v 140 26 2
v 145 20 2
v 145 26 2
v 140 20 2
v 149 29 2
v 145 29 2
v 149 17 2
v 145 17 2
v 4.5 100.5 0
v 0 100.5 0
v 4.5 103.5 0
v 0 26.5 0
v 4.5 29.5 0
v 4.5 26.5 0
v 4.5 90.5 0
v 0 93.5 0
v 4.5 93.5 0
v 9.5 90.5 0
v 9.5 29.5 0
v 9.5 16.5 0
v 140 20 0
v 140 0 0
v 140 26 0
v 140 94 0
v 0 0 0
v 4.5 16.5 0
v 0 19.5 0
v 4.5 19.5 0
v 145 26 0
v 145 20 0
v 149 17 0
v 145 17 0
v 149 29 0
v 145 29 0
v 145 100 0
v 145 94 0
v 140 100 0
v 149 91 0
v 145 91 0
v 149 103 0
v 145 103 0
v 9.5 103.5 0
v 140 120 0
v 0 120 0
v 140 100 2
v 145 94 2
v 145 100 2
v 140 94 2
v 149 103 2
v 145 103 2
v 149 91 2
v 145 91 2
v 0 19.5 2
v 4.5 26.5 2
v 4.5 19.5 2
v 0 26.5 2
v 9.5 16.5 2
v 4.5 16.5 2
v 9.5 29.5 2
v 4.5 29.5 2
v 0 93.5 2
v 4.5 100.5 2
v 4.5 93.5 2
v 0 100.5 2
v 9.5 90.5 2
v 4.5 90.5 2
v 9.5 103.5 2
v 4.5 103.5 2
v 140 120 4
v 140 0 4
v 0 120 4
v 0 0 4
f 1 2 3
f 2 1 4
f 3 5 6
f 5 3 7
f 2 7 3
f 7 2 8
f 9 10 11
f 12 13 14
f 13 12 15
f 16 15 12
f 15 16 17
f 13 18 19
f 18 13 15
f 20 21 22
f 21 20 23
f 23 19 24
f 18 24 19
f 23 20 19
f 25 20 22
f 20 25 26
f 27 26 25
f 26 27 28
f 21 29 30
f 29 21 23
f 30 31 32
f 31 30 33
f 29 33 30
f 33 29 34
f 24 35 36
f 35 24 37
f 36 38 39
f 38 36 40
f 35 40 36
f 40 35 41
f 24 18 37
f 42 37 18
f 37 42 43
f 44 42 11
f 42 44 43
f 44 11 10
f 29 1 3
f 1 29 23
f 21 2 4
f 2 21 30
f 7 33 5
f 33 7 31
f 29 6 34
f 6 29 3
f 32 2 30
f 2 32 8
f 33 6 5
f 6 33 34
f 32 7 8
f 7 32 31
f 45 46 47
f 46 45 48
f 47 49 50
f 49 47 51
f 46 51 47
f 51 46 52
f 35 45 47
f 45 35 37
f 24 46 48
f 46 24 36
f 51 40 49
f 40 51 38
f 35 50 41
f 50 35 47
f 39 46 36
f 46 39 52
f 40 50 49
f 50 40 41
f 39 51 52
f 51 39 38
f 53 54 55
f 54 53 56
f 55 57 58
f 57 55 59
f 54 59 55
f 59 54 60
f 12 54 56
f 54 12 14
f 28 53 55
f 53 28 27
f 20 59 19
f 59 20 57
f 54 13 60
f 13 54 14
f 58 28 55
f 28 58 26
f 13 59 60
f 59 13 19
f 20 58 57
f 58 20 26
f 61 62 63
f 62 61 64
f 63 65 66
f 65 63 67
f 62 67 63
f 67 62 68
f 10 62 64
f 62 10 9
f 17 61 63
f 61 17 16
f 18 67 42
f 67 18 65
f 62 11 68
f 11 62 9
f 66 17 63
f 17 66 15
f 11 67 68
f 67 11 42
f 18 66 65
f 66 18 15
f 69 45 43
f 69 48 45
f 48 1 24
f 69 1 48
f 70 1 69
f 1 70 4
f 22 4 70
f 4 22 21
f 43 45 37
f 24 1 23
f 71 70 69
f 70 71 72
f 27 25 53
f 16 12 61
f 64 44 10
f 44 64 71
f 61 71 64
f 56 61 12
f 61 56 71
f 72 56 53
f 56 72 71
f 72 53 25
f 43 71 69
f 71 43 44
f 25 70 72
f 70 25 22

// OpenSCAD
// file: _settings.scad
// These variables specify the default depth and height of the baseplate
BASE_DEFAULT_HEIGHT =   4; //milimeters
BASE_DEFAULT_DEPTH  = 120; //milimeters


// These variables only need to be modified if you have extreme baseplate sizes
feet_width  = 6;
feet_depth  = 5;
feet_height = 2;
feet_lock_width = 12;
feet_lock_depth =  4;
feet_border = 20;


// This is the code to generate a baseplate-connector (foot)
// You likely won't need to edit this code, unless you want to change the shape.
module foot(x, y, z, d){
    translate(v = [x-1, y-d/2, z-d]) {
        cube([feet_depth+2,feet_width+d,feet_height+d]);
        translate([feet_depth+1-d/2,
                   0-(feet_lock_width - feet_width)/2, 0]){
            cube([feet_lock_depth+d,feet_lock_width+d,feet_height+d]);
        }
    }
}
// file: lib/baseplate.scad
// Include settings
include <../_settings.scad>;

module baseplate(width, depth = BASE_DEFAULT_DEPTH, height = BASE_DEFAULT_HEIGHT,
                 rotate=false){
    if (rotate == true){
        rotate([0,0,180]){
            translate([-width, -depth, 0]){
                _baseplate(width, depth, height);
            }
        }
    } else {
        _baseplate(width, depth, height);
    }
}

module _baseplate(x, y, z){
    foot(x, feet_border, 0, 0);
    foot(x, y - feet_border, 0, 0);

    difference() {
        cube([x,y,z]);
        foot(0, feet_border, 0, 1);
        foot(0, y - feet_border, 0, 1);
    }
}
// main file
// To modify the depth and height of a base-plate, please edit _settings.scad
// By default, the depth is 12 cm, and the height is 4 mm.

// Size settings
baseplate_width  = 140;  //mm

// Cohose here which plate you want to generate:
GENERATE = "base";  // "left", "base" or "right",

// CODE. DO NOT EDIT BELOW UNLESS YOU KNOW WHAT YOU'RE DOING

// Include settings
include <lib/baseplate.scad>;

module right_end(){
    difference() {
        cube([feet_depth+feet_lock_depth+2,baseplate_depth,baseplate_height]);
        foot(0, feet_border, 0, 1);
        foot(0, baseplate_depth - feet_border, 0, 1);
    }
}

module left_end(){
        translate([-2,0,0]){
            cube([2,baseplate_depth,baseplate_height]);
        }
        foot(0, feet_border, 0, 0);
        foot(0, baseplate_depth - feet_border, 0, 0);
}

if (GENERATE == "base")  baseplate(baseplate_width, rotate=false);
if (GENERATE == "left")  left_end();
if (GENERATE == "right") right_end();
